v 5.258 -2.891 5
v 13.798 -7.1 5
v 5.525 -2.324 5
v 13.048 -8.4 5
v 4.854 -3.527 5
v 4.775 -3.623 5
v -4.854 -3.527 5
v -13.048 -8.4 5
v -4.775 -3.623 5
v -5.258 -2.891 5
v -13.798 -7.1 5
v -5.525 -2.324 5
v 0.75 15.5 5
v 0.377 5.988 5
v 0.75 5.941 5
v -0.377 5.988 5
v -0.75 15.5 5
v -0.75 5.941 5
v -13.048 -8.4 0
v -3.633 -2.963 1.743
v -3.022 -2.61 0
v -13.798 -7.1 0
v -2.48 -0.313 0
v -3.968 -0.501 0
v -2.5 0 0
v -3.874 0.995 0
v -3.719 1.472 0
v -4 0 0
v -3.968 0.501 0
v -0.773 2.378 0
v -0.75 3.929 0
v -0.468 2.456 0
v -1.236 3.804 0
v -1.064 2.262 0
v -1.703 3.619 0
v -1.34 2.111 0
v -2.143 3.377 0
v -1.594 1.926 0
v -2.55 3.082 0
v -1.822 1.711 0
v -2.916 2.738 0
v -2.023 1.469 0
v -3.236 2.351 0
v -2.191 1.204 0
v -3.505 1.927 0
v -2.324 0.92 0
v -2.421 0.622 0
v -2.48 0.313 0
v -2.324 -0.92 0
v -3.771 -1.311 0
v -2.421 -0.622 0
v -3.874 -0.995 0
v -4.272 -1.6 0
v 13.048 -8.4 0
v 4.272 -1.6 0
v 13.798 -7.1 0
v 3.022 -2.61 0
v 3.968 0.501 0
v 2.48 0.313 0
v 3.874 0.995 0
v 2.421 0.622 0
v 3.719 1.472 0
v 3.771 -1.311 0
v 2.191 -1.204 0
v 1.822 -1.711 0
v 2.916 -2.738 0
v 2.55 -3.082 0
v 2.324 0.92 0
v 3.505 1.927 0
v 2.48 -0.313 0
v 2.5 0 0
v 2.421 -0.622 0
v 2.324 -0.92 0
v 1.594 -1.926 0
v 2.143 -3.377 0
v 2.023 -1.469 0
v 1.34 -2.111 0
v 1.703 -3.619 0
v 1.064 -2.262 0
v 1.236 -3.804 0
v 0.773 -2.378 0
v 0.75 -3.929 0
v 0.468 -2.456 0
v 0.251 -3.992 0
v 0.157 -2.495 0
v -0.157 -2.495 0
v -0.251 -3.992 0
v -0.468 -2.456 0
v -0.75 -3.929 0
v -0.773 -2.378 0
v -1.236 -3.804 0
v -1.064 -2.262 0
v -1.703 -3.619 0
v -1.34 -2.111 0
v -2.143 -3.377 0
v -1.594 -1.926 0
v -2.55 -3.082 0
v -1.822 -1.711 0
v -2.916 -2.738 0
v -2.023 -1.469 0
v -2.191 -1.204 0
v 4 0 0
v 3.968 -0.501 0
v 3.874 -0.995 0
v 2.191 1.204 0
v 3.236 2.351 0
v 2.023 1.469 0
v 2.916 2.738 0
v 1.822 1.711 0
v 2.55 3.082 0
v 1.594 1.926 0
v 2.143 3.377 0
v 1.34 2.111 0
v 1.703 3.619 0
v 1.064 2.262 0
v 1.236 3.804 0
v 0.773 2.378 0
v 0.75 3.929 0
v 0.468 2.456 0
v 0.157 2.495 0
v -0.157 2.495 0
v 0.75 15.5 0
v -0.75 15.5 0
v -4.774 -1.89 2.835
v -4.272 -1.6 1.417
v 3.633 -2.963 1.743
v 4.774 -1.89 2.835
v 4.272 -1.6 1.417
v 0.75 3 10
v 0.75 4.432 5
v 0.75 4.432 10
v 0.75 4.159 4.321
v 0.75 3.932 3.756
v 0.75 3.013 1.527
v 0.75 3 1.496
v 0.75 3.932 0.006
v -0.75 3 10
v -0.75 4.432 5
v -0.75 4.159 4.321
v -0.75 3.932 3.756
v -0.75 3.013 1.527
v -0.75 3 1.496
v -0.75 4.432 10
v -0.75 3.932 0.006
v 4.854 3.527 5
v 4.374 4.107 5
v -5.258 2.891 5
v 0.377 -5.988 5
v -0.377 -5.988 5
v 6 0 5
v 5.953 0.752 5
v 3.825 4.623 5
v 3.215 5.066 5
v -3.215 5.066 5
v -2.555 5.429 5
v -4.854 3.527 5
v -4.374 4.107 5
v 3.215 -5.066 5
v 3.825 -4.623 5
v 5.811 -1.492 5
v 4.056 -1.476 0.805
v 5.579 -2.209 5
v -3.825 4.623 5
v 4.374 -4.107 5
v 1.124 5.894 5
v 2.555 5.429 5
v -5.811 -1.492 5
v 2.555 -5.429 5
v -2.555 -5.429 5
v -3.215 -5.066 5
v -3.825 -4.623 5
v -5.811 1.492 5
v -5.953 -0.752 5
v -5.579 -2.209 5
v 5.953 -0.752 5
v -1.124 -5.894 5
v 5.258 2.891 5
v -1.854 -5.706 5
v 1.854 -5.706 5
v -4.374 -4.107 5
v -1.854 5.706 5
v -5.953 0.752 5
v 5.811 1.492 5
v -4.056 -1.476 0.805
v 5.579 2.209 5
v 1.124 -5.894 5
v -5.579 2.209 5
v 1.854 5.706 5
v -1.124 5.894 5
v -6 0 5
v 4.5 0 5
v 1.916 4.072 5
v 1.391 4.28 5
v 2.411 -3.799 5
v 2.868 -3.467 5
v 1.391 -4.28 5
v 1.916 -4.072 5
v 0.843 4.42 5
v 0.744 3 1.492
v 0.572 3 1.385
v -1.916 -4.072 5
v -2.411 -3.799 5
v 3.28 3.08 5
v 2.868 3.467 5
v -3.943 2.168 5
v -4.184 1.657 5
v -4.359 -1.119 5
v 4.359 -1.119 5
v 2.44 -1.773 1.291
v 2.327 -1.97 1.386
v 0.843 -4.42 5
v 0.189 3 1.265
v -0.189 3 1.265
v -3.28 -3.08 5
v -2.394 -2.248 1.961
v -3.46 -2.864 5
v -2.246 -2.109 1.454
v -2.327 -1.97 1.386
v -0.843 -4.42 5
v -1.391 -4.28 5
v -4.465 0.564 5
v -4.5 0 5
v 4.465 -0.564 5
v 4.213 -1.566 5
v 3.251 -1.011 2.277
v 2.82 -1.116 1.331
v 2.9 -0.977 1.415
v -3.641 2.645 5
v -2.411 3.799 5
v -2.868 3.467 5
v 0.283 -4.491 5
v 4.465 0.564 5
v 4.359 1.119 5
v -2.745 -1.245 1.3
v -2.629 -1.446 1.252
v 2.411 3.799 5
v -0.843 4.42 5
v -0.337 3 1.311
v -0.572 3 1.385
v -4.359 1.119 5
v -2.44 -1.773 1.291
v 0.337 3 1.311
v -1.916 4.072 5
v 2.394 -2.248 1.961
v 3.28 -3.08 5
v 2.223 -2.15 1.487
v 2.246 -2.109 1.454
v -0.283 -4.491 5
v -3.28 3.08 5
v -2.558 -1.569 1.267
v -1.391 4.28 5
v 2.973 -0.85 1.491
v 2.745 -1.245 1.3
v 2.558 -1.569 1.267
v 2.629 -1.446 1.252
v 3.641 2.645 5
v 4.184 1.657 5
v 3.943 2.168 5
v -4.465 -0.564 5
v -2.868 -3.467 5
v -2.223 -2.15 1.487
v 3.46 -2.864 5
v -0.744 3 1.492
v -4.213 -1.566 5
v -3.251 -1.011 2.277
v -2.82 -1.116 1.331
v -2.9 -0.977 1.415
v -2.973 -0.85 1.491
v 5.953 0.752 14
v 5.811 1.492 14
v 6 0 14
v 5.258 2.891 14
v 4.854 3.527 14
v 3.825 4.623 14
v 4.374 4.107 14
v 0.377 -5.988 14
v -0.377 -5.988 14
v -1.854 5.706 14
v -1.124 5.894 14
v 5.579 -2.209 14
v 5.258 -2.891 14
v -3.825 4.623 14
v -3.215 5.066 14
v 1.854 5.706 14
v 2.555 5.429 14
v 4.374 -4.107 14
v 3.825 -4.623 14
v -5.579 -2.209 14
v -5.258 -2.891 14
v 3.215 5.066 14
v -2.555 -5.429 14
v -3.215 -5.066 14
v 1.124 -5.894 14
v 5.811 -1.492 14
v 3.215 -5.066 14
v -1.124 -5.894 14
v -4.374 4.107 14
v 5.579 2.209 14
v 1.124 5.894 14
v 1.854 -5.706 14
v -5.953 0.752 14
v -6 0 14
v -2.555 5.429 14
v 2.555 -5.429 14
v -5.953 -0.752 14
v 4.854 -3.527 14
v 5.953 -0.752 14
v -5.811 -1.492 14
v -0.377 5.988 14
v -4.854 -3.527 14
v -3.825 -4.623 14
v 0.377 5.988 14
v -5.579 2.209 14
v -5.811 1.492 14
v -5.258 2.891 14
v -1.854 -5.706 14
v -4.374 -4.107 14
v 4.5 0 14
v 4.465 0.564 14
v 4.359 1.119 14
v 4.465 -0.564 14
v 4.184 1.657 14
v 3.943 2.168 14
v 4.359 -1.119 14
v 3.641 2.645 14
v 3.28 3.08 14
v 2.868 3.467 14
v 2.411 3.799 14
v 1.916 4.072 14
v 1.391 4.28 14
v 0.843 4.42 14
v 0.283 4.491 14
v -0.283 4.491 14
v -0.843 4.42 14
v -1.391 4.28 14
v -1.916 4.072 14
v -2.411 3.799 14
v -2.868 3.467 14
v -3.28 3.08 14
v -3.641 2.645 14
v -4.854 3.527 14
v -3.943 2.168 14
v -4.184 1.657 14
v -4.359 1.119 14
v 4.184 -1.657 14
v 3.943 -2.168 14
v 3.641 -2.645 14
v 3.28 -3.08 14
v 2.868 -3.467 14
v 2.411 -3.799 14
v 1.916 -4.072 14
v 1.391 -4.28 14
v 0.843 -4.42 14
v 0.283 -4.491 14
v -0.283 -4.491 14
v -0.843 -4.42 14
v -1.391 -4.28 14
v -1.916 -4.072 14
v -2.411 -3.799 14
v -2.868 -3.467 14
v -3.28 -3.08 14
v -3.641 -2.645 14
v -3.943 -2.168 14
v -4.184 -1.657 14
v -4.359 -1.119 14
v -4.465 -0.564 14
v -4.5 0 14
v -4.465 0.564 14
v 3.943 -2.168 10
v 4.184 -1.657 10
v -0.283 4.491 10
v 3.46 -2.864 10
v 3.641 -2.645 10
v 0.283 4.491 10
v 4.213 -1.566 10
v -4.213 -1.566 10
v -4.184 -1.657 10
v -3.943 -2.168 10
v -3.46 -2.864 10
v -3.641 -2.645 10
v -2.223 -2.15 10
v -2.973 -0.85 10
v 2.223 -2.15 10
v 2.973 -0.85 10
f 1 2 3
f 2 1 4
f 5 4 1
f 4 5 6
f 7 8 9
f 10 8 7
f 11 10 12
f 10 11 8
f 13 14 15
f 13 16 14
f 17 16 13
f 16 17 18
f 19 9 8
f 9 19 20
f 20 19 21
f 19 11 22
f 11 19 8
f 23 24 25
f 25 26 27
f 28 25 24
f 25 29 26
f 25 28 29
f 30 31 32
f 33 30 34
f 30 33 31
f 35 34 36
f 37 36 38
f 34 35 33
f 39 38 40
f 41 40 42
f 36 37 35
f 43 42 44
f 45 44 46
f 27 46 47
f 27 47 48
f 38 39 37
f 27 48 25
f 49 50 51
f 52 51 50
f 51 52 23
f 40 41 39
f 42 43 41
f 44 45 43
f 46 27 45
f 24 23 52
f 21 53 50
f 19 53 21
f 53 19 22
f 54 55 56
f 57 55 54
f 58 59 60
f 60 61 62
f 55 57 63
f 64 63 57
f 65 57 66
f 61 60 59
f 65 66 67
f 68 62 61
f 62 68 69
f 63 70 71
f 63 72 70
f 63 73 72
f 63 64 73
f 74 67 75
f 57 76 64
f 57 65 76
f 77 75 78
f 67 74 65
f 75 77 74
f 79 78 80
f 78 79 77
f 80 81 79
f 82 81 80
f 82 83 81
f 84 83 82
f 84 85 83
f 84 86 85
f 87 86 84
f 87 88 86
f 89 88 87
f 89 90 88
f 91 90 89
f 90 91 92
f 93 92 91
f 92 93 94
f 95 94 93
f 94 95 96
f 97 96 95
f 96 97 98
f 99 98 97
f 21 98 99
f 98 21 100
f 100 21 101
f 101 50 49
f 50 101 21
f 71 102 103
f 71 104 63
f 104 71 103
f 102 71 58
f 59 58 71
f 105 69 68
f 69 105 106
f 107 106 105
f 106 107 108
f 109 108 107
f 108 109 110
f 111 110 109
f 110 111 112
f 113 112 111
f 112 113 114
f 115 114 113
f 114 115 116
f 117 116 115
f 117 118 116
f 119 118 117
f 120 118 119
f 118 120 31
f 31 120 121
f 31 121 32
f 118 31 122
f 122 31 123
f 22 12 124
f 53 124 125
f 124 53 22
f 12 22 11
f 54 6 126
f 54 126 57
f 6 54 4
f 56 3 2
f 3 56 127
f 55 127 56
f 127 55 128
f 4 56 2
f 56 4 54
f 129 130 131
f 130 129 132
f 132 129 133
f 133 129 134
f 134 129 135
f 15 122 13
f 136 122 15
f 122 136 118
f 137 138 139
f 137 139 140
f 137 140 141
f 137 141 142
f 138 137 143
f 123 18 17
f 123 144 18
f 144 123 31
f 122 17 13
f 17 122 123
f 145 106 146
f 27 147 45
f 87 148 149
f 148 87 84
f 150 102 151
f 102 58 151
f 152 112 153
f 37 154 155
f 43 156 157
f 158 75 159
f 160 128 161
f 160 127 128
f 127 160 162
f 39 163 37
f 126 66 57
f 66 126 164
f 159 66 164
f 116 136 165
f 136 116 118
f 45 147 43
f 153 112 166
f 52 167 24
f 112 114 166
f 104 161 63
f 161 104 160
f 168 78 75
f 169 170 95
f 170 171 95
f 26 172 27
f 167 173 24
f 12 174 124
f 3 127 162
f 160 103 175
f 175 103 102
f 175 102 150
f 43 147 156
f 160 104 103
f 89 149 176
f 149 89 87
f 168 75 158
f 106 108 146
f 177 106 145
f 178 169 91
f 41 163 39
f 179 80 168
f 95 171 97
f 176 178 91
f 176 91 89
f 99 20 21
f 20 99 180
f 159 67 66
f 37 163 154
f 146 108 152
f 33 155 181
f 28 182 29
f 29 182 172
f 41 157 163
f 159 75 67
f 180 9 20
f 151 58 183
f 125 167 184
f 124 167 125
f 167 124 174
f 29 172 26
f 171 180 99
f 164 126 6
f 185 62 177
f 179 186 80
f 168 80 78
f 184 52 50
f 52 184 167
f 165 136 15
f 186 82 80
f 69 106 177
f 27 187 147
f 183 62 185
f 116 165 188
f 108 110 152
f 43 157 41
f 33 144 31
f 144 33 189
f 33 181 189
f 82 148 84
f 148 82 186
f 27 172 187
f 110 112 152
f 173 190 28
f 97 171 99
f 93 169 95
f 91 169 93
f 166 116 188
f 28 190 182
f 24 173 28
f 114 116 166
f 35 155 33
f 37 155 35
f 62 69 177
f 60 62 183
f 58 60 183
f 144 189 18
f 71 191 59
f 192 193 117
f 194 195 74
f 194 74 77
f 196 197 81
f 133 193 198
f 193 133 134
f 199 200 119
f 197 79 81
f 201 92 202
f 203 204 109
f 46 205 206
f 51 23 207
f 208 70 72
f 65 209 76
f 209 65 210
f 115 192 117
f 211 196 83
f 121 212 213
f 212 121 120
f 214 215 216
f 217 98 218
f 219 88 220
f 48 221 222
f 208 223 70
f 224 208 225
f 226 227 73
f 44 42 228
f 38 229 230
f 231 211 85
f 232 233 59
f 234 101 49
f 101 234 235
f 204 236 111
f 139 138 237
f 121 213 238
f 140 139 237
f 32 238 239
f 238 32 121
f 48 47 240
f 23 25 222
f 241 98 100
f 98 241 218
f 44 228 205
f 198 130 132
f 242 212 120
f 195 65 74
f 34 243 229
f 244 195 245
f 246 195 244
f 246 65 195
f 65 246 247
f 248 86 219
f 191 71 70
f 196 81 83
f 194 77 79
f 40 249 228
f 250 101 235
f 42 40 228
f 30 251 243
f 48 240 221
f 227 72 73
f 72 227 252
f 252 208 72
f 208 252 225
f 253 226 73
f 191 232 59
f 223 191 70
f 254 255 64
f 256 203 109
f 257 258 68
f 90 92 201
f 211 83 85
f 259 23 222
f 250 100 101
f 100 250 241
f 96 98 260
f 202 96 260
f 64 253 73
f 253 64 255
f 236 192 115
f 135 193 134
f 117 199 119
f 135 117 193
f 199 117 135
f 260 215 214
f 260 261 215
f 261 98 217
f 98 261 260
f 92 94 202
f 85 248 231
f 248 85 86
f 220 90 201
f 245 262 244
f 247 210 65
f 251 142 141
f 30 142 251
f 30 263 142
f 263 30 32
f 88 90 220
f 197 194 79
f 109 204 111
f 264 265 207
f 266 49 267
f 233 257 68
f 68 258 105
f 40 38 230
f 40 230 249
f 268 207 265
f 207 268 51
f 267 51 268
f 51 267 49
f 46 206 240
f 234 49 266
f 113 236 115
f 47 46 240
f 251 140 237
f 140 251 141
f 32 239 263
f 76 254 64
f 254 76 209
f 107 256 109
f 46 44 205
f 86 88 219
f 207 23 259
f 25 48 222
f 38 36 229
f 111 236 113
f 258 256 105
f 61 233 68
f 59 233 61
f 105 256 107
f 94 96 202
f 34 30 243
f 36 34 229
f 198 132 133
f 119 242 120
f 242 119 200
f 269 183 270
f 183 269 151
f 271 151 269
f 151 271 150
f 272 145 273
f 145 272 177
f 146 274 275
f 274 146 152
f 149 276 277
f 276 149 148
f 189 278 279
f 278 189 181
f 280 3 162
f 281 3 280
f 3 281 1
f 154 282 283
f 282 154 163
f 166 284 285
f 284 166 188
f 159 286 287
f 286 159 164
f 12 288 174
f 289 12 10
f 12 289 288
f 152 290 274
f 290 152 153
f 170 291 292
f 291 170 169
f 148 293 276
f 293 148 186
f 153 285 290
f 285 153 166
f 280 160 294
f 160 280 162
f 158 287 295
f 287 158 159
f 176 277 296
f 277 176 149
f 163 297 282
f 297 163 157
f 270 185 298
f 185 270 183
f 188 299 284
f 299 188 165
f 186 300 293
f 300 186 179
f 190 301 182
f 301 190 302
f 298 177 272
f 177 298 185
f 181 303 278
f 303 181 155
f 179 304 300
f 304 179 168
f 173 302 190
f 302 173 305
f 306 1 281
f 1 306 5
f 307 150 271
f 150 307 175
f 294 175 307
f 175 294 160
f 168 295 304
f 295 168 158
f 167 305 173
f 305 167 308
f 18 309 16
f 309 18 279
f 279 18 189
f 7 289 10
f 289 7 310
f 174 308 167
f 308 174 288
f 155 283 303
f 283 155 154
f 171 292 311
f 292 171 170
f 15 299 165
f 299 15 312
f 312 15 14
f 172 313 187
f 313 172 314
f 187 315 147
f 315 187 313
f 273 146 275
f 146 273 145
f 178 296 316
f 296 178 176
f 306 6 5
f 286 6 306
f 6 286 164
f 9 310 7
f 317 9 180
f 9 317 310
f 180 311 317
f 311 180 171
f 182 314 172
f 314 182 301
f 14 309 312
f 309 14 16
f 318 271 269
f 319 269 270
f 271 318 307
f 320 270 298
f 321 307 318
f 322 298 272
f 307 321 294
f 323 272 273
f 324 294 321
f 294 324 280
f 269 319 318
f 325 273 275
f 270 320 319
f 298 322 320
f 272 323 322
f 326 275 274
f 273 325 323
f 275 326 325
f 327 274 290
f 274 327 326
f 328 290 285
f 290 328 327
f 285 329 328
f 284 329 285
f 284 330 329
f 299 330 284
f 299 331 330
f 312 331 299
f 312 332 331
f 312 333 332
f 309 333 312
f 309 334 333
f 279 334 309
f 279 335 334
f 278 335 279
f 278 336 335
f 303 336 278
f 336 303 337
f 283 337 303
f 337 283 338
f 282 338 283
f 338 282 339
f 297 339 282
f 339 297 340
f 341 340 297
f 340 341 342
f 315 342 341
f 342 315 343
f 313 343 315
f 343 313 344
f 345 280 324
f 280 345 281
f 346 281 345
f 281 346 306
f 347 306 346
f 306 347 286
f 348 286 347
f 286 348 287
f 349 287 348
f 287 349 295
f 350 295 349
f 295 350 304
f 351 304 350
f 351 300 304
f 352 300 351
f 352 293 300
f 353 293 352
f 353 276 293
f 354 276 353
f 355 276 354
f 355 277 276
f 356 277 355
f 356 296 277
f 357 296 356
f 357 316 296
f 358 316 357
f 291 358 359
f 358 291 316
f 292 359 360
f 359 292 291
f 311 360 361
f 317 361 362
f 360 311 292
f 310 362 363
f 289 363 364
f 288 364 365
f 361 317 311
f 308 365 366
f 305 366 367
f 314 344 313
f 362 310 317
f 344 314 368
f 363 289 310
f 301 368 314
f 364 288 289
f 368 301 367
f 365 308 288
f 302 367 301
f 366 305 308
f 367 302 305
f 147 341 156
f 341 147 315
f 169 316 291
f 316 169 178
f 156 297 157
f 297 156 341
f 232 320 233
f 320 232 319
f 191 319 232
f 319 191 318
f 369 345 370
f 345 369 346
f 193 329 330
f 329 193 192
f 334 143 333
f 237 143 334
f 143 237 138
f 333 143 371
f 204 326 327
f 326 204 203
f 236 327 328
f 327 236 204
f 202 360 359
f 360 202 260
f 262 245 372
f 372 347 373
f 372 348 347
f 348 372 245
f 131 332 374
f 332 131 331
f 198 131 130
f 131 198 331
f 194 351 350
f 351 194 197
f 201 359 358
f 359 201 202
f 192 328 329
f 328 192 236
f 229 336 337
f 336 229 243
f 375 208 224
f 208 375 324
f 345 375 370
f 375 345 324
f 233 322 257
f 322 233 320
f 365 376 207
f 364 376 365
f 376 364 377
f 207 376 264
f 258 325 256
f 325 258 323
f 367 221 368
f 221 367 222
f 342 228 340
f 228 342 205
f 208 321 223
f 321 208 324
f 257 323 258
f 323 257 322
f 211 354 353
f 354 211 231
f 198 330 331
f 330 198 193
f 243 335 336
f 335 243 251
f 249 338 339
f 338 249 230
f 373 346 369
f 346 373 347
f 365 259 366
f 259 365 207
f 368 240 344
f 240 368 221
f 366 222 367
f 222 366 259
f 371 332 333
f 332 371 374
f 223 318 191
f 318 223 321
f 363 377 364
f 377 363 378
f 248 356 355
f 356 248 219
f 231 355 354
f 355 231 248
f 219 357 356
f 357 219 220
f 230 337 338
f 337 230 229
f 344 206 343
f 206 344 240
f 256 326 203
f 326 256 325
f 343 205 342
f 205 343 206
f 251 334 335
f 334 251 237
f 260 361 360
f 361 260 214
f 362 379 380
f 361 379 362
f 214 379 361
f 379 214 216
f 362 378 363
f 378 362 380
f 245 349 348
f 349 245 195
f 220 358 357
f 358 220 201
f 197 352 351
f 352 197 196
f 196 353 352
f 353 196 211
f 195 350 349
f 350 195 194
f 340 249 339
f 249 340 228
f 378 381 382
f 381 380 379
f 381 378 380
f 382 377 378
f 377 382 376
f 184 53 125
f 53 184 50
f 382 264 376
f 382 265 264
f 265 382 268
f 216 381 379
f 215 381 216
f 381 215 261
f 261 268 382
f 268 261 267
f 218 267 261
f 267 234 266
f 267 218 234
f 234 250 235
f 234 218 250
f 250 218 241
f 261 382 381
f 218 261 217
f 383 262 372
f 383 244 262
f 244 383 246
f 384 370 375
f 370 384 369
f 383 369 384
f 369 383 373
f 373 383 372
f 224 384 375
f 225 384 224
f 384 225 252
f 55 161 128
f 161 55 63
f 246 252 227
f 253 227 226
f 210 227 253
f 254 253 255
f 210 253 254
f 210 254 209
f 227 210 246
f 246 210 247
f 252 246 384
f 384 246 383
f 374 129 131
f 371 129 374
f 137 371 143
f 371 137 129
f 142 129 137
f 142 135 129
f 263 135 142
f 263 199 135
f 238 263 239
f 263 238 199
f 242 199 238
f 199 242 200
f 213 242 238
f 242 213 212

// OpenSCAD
blade_support_or = 4;
blade_support_ir = 2.5;
blade_height = 5;
blade_length = 13;
blade_thickness = 1.5;

num_blades = 3;

latch_or = 6;
latch_ir = 4.5;
latch_height = 9;
clasp_width = 1.5;
clasp_thickness = 1.5;
clasp_recess = 4;

$fn = 50;
difference() {
    union() {
        cylinder(h = blade_height, r1 = blade_support_or, r2 = latch_or);
        
        for (i = [1:num_blades]) {
            rotate_angle = i * (360 / num_blades);
            rotate([0, 0, rotate_angle])
            translate([-blade_thickness / 2, blade_support_ir, 0])
                cube([blade_thickness, blade_length, blade_height]);
        }
    }
    cylinder(h = blade_height, r1 = blade_support_ir, r2 = latch_ir);
}

translate([0, 0, blade_height]) {
    difference() {
        cylinder(h = latch_height, r = latch_or);
        cylinder(h = latch_height, r = latch_ir);
    }
    
    for (i = [1:3]) {
        rotate([0, 0, i * 360 / 3])
            translate([-clasp_width / 2, latch_ir - clasp_thickness, -blade_height])
                cube([clasp_width, clasp_thickness, latch_height + blade_height - clasp_recess]);
    }
}
